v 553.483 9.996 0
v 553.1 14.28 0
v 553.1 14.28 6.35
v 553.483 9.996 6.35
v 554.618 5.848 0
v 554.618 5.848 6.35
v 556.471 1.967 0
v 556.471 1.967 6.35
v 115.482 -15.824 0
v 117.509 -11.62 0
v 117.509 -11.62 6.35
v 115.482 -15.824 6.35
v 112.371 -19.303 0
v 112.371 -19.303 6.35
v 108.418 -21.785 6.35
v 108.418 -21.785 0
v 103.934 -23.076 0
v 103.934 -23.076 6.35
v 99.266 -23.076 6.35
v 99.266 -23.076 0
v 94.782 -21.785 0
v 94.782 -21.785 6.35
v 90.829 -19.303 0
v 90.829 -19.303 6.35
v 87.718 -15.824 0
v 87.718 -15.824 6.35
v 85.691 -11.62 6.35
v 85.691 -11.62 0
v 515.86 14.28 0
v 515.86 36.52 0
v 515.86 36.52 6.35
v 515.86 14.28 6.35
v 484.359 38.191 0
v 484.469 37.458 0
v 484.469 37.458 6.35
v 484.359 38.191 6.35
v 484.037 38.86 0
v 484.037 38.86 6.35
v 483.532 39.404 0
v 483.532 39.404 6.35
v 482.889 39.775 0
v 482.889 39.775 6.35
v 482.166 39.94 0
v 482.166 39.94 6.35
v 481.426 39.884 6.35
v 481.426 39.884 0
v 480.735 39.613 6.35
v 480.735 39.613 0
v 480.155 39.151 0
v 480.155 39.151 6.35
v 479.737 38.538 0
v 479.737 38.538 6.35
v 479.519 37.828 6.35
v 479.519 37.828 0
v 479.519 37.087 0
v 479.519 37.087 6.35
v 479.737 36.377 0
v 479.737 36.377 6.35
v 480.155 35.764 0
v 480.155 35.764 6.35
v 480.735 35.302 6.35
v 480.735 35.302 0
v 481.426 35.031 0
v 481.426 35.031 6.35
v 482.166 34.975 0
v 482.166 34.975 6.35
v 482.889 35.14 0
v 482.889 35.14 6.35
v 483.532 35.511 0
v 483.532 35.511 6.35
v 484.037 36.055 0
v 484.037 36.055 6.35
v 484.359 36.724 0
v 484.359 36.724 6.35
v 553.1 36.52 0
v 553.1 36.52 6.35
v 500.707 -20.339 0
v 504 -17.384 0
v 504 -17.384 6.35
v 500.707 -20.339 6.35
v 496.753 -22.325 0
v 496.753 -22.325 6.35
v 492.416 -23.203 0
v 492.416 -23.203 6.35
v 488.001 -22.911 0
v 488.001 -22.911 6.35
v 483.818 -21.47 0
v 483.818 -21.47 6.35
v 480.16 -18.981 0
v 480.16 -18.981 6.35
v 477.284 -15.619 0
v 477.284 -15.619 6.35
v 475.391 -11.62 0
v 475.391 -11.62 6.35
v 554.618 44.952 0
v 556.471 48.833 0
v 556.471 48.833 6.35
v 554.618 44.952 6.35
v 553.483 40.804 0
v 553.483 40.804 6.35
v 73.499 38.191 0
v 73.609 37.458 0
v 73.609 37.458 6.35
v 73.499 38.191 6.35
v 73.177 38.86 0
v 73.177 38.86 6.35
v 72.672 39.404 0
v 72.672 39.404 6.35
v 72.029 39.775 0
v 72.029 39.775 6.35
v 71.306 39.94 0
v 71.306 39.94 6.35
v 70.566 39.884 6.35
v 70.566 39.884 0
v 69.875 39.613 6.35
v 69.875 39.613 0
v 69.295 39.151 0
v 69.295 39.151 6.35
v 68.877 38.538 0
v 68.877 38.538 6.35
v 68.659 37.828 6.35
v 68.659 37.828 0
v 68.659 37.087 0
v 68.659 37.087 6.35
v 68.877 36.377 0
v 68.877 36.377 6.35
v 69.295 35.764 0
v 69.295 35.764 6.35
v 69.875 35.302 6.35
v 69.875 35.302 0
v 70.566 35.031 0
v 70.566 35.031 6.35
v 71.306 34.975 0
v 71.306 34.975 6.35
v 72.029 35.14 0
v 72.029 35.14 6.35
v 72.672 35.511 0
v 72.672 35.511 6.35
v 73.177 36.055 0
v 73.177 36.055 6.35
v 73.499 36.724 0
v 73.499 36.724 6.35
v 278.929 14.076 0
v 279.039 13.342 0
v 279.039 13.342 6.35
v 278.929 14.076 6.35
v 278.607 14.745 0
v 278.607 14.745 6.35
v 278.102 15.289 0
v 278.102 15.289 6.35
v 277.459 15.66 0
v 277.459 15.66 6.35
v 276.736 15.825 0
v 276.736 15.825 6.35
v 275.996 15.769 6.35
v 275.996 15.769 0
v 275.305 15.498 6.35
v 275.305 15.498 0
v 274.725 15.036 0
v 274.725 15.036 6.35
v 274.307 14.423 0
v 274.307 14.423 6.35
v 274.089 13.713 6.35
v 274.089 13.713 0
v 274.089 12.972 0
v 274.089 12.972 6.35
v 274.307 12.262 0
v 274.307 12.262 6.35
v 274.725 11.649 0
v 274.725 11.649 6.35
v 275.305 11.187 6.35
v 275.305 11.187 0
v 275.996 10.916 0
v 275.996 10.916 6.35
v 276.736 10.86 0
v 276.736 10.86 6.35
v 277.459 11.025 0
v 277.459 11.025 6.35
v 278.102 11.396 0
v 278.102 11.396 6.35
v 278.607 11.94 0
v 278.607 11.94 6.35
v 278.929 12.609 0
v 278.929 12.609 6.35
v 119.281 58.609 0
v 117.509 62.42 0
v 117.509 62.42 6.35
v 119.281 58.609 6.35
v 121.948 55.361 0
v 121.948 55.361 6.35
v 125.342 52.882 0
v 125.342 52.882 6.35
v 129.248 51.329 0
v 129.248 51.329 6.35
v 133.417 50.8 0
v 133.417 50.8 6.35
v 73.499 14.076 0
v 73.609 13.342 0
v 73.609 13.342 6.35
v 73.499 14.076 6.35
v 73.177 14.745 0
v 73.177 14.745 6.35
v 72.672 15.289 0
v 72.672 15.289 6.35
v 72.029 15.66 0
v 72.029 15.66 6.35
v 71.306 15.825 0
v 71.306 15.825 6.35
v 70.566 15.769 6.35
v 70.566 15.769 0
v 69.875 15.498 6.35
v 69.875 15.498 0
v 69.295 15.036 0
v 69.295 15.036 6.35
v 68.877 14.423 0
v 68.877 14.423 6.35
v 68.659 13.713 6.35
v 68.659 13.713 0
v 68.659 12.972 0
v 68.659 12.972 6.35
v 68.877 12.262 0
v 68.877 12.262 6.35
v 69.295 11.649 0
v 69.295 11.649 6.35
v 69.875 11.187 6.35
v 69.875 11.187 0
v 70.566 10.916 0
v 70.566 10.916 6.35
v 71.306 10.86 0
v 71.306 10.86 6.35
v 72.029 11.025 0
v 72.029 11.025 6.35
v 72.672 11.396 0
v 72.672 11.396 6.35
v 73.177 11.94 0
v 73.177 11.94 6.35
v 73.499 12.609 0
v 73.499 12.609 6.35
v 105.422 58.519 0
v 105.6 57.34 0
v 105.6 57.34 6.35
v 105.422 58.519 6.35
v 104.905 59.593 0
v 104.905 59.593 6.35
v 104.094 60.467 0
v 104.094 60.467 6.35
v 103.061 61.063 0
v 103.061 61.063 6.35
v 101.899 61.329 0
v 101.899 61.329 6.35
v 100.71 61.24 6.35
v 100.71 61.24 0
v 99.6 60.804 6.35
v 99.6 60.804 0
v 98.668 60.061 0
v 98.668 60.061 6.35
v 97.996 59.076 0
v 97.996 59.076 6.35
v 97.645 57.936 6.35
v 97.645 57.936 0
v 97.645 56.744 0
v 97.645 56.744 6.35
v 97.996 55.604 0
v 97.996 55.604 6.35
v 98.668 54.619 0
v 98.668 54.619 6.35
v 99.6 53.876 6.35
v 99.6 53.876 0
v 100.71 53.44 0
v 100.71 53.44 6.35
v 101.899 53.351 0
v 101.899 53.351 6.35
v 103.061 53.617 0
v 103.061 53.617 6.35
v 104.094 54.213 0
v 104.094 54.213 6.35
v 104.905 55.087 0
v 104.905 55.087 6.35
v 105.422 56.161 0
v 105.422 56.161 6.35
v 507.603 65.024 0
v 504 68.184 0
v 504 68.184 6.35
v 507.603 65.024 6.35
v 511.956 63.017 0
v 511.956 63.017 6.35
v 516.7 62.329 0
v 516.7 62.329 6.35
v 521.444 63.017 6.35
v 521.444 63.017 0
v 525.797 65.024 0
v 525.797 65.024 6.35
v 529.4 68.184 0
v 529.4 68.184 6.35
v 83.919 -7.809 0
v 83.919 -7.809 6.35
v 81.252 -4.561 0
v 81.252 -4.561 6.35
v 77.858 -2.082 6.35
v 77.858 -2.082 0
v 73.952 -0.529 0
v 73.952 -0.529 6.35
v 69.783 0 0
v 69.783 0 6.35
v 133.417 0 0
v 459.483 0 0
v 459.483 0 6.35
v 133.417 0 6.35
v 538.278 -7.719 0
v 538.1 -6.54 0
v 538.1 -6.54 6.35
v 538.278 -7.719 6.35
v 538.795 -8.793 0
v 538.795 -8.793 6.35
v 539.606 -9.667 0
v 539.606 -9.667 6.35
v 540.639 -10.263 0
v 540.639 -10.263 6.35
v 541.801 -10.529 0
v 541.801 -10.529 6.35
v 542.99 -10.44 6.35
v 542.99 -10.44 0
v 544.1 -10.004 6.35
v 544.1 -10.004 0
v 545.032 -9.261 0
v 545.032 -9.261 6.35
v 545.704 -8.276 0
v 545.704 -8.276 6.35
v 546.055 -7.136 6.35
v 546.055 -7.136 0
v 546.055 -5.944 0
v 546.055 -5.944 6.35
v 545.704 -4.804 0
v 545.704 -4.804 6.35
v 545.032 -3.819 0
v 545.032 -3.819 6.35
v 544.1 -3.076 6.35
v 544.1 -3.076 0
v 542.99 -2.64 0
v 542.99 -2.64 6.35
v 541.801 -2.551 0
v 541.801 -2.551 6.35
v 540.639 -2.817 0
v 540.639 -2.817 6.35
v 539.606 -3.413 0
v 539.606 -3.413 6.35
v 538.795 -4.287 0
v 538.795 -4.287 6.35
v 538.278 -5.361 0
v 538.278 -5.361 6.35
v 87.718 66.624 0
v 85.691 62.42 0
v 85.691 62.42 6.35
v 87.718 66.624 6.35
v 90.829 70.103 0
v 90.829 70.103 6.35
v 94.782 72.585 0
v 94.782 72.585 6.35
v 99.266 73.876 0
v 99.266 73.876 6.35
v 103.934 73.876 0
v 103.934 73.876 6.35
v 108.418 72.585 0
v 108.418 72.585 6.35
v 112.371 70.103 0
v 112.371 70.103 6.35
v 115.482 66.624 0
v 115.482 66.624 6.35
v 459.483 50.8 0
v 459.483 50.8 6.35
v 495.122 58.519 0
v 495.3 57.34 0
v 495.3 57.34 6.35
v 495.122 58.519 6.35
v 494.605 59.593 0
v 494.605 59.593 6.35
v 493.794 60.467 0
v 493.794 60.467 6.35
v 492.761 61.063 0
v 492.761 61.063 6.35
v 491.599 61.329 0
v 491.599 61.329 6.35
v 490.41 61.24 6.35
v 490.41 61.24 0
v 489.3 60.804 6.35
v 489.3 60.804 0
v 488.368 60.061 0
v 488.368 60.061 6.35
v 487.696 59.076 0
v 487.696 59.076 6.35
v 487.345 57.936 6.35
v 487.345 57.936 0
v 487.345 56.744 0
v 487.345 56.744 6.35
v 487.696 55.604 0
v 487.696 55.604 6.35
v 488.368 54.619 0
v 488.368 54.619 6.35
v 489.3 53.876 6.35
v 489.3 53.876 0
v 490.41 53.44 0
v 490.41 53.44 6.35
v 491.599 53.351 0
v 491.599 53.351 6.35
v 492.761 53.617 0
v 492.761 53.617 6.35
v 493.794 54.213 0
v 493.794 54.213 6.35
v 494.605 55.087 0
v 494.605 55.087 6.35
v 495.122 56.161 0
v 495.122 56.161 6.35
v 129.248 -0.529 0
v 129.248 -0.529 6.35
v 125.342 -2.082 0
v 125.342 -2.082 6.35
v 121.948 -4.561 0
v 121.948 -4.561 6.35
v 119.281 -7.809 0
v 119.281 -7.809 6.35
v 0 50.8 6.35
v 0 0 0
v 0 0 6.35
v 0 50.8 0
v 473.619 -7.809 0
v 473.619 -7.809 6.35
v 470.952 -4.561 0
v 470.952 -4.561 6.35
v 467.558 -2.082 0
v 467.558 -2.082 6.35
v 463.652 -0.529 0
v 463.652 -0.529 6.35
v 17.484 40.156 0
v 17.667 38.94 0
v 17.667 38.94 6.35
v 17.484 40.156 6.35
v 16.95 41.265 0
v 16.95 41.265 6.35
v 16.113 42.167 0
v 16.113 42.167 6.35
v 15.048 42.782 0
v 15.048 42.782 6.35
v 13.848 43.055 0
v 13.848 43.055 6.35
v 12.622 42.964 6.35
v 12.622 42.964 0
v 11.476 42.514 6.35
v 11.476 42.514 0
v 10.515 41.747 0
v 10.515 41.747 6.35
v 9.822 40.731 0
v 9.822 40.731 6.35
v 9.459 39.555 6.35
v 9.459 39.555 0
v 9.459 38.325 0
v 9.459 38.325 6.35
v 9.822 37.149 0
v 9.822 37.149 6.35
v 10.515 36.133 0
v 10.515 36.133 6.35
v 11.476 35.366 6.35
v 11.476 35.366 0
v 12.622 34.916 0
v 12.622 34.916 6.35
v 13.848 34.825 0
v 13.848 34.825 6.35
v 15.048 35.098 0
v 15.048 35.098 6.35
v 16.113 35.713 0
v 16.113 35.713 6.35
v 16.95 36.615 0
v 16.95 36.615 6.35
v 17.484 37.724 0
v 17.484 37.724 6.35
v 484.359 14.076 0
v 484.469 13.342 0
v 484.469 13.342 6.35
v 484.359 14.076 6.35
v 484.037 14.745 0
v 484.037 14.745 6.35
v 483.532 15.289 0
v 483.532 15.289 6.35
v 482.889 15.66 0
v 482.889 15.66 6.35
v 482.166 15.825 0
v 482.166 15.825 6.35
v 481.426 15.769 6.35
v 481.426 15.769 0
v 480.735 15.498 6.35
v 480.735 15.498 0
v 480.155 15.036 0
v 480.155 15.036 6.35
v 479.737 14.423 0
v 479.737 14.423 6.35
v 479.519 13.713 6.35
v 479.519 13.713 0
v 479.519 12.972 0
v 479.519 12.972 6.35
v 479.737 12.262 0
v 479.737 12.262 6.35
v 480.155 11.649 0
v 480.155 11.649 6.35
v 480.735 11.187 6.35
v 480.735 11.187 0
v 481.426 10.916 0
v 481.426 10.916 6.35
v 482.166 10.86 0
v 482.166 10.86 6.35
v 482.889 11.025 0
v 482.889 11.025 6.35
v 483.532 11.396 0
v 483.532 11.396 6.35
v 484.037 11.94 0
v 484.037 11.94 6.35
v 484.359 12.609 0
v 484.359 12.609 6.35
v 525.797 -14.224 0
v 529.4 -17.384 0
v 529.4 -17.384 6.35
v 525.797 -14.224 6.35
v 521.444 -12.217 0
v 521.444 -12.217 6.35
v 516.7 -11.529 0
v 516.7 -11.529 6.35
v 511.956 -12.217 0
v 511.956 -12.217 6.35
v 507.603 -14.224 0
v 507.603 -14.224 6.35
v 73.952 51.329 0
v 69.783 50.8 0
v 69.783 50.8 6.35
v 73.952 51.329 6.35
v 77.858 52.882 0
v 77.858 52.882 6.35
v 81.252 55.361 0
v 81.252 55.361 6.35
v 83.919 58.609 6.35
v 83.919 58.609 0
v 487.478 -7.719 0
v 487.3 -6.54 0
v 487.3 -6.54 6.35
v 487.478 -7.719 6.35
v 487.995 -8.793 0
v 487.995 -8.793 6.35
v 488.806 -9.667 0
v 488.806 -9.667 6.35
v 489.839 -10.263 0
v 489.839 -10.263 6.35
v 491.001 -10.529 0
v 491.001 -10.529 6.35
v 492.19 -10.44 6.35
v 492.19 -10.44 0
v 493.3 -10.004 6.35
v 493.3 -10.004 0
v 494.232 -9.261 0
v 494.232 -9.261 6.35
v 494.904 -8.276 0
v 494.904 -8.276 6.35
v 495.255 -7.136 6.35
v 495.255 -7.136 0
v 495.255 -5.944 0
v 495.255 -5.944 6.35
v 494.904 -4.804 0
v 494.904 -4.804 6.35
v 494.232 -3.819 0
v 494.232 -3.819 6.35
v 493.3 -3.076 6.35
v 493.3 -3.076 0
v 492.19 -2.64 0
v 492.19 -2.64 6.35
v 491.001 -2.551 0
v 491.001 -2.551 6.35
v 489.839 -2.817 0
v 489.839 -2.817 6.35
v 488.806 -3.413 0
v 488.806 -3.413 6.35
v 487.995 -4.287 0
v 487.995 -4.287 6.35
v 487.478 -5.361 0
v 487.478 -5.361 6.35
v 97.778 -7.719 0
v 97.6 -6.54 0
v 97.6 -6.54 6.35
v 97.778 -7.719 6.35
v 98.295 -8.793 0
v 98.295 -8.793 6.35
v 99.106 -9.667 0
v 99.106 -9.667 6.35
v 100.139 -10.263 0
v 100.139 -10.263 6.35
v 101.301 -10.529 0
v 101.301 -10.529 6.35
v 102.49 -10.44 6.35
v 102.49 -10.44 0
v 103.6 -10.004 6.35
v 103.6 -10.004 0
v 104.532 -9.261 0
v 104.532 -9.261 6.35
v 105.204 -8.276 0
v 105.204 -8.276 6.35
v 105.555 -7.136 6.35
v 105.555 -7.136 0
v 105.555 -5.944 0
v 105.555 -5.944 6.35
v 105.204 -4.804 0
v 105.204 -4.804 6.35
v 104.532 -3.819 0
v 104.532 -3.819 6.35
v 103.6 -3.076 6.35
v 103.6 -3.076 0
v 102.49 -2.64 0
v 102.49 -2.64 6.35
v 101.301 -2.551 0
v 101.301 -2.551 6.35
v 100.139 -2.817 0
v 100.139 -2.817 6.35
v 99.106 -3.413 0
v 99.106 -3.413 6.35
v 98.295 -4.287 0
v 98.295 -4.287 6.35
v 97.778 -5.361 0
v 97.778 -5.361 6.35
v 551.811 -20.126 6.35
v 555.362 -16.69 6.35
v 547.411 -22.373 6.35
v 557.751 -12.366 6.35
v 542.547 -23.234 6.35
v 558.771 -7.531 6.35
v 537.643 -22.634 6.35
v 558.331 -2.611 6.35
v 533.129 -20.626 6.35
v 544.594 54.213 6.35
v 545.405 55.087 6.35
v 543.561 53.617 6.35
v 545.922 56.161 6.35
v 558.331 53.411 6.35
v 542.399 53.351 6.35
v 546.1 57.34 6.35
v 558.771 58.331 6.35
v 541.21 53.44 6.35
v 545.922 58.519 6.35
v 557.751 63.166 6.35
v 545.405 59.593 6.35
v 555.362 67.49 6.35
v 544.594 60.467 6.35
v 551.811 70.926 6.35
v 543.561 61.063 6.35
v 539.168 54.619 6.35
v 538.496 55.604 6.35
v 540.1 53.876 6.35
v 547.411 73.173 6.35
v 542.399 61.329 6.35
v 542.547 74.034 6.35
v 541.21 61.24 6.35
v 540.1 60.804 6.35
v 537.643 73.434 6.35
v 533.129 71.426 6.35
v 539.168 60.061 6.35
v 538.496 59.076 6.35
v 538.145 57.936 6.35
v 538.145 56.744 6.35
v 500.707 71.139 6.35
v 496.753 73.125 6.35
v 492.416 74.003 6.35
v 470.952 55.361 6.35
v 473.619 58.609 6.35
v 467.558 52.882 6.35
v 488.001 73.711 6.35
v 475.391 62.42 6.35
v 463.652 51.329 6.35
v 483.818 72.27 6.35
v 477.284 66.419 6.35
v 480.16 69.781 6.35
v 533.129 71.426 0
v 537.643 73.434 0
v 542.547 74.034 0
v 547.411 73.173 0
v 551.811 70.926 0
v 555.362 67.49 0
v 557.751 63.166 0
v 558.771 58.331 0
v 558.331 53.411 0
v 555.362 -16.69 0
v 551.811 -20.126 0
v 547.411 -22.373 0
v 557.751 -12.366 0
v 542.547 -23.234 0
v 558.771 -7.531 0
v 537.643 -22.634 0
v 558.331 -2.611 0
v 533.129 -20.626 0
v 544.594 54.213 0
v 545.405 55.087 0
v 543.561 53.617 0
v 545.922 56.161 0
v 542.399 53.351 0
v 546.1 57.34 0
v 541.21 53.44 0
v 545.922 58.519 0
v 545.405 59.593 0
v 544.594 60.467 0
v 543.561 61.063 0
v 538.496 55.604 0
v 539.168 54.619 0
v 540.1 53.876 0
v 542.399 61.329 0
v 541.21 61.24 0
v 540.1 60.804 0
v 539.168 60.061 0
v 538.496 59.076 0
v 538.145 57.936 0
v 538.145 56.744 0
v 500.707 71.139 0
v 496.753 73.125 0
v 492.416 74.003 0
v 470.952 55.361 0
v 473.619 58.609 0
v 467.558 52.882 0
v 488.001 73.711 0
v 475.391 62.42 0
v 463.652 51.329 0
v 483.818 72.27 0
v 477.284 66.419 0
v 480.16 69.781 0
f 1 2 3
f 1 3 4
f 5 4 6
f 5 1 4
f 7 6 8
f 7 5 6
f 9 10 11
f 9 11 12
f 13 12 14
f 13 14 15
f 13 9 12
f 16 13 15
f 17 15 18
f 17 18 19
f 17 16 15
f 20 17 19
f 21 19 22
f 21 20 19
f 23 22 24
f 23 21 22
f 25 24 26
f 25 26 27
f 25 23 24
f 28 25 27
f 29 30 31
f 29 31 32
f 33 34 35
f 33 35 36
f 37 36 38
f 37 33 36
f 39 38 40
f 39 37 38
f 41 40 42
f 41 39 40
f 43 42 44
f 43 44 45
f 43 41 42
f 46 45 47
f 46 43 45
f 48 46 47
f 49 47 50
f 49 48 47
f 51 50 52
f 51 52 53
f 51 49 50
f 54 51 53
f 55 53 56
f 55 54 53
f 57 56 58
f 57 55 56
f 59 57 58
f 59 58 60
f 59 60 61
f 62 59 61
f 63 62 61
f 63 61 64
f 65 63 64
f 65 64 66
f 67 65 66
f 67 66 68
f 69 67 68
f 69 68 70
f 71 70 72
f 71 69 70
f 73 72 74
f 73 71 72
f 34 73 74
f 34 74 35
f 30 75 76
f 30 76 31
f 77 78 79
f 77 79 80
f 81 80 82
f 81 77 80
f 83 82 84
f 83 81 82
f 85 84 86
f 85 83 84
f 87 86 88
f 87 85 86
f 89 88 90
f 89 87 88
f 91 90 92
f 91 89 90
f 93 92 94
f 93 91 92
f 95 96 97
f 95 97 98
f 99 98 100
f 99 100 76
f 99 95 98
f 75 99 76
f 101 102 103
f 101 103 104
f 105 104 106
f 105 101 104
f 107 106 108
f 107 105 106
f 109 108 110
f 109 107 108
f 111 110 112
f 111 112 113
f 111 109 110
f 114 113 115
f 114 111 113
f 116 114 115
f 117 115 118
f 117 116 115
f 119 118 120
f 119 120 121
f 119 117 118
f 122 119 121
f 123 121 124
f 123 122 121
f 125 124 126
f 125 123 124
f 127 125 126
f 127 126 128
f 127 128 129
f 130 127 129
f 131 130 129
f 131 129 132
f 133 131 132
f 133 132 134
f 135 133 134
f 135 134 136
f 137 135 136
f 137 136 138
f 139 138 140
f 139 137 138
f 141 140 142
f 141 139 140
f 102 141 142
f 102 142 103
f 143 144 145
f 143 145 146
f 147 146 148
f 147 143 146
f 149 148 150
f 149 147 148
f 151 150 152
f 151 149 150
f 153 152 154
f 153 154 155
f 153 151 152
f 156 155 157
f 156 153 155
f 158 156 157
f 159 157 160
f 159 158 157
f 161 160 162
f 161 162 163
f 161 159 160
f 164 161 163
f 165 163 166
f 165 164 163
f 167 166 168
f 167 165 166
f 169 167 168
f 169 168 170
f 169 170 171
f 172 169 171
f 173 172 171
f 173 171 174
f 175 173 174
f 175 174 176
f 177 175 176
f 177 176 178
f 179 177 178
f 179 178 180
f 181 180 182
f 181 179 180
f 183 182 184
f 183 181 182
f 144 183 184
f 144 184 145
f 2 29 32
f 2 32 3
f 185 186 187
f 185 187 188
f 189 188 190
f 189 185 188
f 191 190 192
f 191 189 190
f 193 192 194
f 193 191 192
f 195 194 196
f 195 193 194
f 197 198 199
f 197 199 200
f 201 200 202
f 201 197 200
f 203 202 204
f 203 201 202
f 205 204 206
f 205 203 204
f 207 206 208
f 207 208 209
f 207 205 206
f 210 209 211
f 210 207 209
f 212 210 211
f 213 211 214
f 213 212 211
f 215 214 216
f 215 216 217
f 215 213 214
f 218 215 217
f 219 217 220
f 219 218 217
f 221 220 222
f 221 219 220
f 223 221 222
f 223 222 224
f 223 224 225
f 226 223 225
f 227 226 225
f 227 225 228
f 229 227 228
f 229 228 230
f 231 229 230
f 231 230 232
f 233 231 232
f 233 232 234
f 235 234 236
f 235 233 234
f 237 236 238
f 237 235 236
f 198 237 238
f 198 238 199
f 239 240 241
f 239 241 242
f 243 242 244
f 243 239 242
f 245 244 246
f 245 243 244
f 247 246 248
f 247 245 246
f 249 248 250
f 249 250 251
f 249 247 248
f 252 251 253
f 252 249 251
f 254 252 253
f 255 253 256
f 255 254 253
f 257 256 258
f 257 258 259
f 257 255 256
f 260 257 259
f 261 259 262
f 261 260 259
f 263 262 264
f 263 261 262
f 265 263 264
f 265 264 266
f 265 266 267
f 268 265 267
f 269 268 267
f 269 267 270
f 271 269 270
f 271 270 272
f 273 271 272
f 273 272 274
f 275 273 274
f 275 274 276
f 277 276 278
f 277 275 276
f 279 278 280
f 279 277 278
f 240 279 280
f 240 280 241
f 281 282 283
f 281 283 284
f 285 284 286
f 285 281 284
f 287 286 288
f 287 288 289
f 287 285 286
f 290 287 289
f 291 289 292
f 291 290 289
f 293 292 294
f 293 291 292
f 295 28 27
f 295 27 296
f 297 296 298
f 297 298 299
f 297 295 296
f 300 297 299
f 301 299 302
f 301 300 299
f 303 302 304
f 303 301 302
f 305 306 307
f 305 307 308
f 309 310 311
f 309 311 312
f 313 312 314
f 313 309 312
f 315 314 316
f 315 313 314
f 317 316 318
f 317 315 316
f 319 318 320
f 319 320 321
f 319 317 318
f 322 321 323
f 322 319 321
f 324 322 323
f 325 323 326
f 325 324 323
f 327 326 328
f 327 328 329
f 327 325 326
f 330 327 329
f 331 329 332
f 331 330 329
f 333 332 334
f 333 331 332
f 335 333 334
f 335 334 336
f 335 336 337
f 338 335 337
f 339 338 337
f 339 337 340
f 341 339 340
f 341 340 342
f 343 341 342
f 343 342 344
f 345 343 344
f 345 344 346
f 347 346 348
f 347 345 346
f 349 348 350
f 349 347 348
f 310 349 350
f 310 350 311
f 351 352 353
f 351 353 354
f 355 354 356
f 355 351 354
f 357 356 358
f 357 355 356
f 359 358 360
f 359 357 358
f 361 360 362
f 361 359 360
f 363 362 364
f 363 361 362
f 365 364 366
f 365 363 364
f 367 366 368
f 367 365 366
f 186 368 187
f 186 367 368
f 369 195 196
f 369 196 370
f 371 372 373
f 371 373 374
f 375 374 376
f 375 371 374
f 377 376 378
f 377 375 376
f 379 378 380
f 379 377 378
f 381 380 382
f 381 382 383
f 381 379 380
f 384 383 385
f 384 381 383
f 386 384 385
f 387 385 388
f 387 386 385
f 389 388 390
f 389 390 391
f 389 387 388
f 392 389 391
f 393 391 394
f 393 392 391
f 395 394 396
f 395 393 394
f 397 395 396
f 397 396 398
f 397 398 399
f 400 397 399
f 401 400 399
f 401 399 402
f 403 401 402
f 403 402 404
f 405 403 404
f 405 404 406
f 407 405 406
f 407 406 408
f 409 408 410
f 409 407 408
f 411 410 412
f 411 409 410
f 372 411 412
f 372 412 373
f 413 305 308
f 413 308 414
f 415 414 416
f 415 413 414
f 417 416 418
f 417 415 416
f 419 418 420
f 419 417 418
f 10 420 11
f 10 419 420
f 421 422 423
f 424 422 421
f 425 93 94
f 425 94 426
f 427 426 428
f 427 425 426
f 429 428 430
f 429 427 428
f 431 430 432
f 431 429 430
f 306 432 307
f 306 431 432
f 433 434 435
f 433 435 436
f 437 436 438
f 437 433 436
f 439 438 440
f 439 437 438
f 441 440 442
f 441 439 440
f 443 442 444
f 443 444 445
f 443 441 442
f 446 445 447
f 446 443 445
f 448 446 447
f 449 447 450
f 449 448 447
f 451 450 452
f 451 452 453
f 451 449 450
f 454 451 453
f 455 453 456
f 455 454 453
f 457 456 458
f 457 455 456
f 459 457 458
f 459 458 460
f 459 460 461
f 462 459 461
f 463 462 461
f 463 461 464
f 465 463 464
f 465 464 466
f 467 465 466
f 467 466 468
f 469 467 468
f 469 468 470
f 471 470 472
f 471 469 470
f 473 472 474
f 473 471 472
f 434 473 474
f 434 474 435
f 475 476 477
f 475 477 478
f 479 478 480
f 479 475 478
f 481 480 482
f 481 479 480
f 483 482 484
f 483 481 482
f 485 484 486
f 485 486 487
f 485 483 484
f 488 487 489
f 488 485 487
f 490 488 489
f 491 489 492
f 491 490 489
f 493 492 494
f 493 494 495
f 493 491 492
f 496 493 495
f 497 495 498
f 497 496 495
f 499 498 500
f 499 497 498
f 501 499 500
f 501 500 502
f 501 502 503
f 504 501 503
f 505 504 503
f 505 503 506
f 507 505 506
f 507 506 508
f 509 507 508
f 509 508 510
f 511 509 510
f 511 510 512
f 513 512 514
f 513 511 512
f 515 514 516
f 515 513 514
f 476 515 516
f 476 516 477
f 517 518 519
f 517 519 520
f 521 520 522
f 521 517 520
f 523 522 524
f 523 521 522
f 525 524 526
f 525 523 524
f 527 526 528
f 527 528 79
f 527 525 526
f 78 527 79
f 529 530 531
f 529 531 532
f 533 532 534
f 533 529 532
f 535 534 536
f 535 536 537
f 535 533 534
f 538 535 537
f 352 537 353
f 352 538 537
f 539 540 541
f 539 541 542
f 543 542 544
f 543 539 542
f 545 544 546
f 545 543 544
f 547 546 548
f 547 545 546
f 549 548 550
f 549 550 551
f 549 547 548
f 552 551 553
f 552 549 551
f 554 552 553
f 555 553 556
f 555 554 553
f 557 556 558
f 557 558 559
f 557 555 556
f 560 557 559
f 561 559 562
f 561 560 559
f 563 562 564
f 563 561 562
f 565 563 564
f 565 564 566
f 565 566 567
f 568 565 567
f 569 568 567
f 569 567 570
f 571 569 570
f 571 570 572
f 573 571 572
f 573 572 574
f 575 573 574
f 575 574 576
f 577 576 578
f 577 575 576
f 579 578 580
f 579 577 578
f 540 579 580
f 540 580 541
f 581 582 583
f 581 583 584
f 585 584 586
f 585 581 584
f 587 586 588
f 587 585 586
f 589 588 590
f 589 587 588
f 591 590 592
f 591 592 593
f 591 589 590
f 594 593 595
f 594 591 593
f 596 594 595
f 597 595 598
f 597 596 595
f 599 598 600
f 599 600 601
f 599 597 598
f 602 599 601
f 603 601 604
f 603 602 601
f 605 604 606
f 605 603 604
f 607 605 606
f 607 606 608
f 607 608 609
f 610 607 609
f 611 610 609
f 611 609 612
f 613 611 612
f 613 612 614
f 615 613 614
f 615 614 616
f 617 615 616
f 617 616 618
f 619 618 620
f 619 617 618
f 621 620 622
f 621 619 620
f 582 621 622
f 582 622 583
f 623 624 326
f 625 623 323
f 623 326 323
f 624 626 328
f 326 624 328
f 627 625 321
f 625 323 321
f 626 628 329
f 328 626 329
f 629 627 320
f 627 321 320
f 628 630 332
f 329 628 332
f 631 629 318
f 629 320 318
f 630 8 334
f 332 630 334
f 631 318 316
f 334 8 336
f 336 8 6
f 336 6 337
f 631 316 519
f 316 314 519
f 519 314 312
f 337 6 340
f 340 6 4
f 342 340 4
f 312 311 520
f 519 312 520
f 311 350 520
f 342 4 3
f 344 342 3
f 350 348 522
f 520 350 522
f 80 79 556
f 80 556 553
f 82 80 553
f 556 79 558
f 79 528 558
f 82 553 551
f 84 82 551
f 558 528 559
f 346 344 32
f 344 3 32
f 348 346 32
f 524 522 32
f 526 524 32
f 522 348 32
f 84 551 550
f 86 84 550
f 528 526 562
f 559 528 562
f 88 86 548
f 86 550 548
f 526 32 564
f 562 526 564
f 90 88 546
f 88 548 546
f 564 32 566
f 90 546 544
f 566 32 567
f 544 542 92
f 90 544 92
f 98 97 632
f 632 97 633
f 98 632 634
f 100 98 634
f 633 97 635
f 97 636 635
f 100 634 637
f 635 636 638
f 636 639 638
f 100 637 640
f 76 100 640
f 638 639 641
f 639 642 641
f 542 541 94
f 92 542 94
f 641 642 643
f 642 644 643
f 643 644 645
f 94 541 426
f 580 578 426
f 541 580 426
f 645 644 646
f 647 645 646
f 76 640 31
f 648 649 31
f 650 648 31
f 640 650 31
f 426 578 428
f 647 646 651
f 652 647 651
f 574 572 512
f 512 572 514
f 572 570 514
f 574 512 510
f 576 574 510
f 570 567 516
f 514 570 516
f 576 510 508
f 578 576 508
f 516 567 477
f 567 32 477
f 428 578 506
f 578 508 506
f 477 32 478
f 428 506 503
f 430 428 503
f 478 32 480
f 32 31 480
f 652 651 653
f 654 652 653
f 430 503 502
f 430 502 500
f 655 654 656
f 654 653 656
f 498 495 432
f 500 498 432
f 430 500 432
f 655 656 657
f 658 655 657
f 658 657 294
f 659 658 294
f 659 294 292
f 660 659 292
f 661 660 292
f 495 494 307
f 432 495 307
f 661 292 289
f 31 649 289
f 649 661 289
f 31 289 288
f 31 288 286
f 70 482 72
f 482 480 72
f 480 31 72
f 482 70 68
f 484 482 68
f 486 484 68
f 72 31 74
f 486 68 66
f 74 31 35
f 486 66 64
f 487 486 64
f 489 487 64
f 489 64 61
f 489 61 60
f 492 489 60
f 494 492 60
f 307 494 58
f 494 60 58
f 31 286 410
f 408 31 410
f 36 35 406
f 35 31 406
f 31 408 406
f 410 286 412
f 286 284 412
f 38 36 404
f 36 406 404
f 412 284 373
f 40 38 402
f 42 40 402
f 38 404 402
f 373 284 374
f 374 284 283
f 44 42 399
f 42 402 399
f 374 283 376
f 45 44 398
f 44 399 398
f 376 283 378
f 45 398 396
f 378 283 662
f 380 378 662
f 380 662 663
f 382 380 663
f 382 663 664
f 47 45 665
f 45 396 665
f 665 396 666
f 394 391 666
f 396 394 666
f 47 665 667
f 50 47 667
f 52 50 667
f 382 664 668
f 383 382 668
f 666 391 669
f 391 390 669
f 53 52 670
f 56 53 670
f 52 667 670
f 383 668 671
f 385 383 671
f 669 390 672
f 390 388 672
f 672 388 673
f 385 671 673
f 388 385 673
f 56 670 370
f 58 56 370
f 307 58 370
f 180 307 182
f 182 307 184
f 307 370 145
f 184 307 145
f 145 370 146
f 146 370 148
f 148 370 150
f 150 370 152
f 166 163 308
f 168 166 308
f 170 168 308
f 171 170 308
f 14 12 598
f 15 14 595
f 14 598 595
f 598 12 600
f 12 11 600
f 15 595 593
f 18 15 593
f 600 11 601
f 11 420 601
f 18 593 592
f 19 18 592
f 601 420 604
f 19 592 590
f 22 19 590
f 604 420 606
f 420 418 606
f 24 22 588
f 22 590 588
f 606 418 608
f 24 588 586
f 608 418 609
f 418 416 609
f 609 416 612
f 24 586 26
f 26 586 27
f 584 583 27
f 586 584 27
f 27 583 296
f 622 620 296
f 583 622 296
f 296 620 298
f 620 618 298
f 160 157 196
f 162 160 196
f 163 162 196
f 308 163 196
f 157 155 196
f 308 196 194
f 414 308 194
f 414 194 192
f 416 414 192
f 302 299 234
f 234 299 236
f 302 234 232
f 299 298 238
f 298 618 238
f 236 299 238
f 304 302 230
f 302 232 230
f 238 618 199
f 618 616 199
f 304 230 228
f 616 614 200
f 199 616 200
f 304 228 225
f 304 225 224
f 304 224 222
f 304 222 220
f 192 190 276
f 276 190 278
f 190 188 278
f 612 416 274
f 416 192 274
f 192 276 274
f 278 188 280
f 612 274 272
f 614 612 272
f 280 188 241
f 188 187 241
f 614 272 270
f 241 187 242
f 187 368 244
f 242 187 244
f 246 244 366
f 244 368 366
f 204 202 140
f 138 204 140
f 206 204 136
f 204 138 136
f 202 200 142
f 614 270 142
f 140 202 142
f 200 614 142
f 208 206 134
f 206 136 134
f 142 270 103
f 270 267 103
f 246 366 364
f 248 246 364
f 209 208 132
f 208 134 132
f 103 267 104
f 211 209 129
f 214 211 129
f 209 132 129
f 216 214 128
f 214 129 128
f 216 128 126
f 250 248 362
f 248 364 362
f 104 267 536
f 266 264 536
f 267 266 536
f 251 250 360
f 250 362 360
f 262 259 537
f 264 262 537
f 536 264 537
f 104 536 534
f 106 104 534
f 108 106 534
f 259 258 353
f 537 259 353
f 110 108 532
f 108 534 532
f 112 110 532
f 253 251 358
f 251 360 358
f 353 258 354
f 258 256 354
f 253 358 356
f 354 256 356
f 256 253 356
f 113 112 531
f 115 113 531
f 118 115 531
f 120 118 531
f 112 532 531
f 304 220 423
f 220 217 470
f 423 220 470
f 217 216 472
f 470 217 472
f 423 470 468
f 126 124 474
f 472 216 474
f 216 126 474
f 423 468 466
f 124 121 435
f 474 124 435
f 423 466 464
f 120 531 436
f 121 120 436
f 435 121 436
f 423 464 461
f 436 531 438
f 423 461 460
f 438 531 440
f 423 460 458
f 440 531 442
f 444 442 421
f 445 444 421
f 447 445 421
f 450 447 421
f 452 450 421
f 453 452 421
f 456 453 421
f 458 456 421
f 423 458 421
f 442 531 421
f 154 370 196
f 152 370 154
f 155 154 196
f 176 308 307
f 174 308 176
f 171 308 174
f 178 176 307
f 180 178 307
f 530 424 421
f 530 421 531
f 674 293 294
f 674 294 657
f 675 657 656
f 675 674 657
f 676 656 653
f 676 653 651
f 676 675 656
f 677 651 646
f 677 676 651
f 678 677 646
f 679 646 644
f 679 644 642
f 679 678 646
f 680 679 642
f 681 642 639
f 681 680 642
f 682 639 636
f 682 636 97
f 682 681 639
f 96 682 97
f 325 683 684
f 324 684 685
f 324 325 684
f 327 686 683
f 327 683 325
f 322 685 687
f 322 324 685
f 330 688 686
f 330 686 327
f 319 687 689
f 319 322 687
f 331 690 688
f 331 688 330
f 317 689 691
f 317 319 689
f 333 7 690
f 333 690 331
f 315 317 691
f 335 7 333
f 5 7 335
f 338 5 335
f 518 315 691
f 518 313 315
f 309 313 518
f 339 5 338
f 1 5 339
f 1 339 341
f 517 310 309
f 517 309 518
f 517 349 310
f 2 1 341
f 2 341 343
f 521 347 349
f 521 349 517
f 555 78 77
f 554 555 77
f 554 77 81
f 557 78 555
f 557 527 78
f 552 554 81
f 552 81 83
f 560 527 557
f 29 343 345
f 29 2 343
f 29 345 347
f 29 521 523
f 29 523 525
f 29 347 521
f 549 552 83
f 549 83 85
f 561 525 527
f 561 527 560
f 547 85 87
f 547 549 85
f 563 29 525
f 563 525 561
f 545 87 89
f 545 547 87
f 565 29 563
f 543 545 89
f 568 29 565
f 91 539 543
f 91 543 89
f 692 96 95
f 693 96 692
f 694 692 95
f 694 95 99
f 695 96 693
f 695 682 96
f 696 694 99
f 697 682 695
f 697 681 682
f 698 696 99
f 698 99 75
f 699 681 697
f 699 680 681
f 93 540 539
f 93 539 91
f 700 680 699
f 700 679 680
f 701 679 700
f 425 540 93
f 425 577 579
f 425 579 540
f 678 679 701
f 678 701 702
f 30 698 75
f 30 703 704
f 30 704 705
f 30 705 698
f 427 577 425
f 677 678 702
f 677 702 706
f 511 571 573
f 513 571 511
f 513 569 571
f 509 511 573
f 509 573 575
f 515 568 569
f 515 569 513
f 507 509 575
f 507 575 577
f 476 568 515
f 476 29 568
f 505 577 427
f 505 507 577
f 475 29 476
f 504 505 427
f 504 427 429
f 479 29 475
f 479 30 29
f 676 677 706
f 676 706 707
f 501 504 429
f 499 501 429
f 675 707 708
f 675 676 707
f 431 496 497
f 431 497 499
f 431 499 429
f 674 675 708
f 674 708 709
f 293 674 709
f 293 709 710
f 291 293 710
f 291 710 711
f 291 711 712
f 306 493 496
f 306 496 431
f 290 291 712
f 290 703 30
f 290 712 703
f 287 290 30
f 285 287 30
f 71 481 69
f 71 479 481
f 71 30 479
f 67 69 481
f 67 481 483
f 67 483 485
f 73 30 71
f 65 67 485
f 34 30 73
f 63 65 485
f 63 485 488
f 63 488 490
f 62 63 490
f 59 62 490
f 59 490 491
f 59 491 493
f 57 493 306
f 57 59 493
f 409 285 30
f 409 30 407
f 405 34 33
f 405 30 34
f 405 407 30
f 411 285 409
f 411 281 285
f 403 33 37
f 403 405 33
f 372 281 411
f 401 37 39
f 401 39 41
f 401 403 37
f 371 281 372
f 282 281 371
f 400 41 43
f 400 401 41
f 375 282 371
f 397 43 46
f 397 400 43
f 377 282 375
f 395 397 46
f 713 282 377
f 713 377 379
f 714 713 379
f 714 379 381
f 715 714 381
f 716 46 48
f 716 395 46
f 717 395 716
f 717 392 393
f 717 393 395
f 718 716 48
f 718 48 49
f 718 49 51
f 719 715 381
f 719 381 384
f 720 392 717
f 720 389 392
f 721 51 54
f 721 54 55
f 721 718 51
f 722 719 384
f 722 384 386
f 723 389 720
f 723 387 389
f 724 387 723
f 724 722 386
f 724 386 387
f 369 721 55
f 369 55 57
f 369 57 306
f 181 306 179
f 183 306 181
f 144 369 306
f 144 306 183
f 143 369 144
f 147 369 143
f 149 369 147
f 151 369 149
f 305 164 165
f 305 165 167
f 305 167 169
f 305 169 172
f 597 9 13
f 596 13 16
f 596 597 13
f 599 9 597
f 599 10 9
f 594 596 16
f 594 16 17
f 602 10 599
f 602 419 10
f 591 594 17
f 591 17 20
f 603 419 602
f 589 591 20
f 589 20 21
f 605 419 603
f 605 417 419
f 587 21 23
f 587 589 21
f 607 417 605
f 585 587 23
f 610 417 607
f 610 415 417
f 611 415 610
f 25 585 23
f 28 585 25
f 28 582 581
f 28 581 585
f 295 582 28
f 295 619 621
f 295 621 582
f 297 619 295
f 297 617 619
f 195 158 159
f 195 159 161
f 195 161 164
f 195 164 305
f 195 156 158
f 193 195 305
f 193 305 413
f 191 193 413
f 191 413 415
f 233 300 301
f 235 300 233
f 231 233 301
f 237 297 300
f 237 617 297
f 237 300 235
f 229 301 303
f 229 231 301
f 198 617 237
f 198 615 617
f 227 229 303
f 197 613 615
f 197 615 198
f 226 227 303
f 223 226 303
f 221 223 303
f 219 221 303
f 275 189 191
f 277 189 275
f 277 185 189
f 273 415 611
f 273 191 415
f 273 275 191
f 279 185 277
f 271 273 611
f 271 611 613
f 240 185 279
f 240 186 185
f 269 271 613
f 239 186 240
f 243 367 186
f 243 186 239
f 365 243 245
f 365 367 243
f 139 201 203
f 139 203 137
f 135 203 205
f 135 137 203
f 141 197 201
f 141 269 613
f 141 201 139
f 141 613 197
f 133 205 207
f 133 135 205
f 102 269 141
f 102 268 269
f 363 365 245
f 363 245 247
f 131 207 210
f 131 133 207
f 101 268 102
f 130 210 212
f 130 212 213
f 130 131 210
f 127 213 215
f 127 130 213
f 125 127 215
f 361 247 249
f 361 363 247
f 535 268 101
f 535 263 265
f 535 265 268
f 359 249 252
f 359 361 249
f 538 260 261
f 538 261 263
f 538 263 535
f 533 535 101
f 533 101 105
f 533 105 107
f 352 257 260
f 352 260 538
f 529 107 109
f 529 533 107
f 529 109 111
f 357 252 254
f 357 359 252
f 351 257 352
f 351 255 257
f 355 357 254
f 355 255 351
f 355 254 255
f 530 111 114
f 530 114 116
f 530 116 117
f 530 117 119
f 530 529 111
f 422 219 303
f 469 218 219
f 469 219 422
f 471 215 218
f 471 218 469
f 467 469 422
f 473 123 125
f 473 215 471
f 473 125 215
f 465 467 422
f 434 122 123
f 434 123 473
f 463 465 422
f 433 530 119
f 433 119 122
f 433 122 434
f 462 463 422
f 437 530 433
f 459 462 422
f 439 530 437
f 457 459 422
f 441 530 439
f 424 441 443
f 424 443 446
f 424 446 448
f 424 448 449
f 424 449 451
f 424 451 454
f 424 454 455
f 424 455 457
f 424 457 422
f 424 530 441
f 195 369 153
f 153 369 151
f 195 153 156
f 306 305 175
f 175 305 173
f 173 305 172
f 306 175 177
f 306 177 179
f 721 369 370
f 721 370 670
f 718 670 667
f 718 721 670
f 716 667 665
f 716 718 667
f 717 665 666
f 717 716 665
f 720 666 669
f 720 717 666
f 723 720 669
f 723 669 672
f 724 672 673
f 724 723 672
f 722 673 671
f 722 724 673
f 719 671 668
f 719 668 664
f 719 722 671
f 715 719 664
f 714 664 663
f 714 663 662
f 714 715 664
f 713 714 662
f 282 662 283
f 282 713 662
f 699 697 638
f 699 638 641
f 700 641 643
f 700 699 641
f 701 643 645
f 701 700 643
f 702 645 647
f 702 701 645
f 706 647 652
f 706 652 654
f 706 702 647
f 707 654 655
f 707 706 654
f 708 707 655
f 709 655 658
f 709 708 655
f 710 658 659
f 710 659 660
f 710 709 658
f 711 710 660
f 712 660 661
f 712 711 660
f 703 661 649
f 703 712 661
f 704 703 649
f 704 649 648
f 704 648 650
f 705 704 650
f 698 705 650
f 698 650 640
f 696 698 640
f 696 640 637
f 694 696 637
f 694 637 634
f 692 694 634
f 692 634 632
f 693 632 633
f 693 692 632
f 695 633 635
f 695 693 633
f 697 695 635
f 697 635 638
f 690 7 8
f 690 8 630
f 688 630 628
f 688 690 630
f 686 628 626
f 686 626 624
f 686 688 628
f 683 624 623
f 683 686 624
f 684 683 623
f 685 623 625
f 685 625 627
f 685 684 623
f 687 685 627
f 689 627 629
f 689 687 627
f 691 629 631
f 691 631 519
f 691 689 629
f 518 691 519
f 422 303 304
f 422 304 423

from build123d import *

# Parameters (mm, degrees)
SKETCH1_R           = 4.127
SKETCH1_R_2         = 4
SKETCH1_R_3         = 2.4892
BOSS_EXTRUDE1_DEPTH = 6.35


with BuildPart() as part:
    # Sketch1 → Boss-Extrude1 (new body)
    with BuildSketch(Plane.XY):
        with BuildLine():
            Line((0, 50.8), (69.782797106, 50.8))
            ThreePointArc((69.782797106, 50.8), (79.63302553, 54.01434095), (85.691398553, 62.42))
            ThreePointArc((85.691398553, 62.42), (101.6, 74.04), (117.508601447, 62.42))
            ThreePointArc((117.508601447, 62.42), (123.56697447, 54.01434095), (133.417202894, 50.8))
            Line((133.417202894, 50.8), (459.482797106, 50.8))
            ThreePointArc((459.482797106, 50.8), (469.33302553, 54.01434095), (475.391398553, 62.42))
            ThreePointArc((475.391398553, 62.42), (488.001405867, 73.710988875), (504, 68.184353369))
            ThreePointArc((504, 68.184353369), (516.7, 62.328706739), (529.4, 68.184353369))
            ThreePointArc((529.4, 68.184353369), (551.811441752, 70.92594491), (556.471129688, 48.833494754))
            ThreePointArc((556.471129688, 48.833494754), (553.958009173, 42.90331161), (553.1, 36.52))
            Line((553.1, 36.52), (515.860000058, 36.52))
            Line((515.860000058, 36.52), (515.860000058, 14.28))
            Line((515.860000058, 14.28), (553.1, 14.28))
            ThreePointArc((553.1, 14.28), (553.958009173, 7.89668839), (556.471129688, 1.966505246))
            ThreePointArc((556.471129688, 1.966505246), (551.811441752, -20.12594491), (529.4, -17.384353369))
            ThreePointArc((529.4, -17.384353369), (516.7, -11.528706739), (504, -17.384353369))
            ThreePointArc((504, -17.384353369), (488.001405867, -22.910988875), (475.391398553, -11.62))
            ThreePointArc((475.391398553, -11.62), (469.33302553, -3.21434095), (459.482797106, 0))
            Line((459.482797106, 0), (133.417202894, 0))
            ThreePointArc((133.417202894, 0), (123.56697447, -3.21434095), (117.508601447, -11.62))
            ThreePointArc((117.508601447, -11.62), (101.6, -23.24), (85.691398553, -11.62))
            ThreePointArc((85.691398553, -11.62), (79.63302553, -3.21434095), (69.782797106, 0))
            Line((69.782797106, 0), (0, 0))
            Line((0, 0), (0, 50.8))
        make_face()
        with Locations((13.54, 38.94)):
            Circle(SKETCH1_R, mode=Mode.SUBTRACT)
        with Locations(Location((101.6, -6.54, 0), (0, 0, 180))):
            Circle(SKETCH1_R_2, mode=Mode.SUBTRACT)
        with Locations((481.98, 13.3425)):
            Circle(SKETCH1_R_3, mode=Mode.SUBTRACT)
        with Locations((481.98, 37.4575)):
            Circle(SKETCH1_R_3, mode=Mode.SUBTRACT)
        with Locations((276.55, 13.3425)):
            Circle(SKETCH1_R_3, mode=Mode.SUBTRACT)
        with Locations((71.12, 13.3425)):
            Circle(SKETCH1_R_3, mode=Mode.SUBTRACT)
        with Locations((71.12, 37.4575)):
            Circle(SKETCH1_R_3, mode=Mode.SUBTRACT)
        with Locations((101.6, 57.34)):
            Circle(SKETCH1_R_2, mode=Mode.SUBTRACT)
        with Locations((491.3, 57.34)):
            Circle(SKETCH1_R_2, mode=Mode.SUBTRACT)
        with Locations((542.1, 57.34)):
            Circle(SKETCH1_R_2, mode=Mode.SUBTRACT)
        with Locations(Location((542.1, -6.54, 0), (0, 0, 180))):
            Circle(SKETCH1_R_2, mode=Mode.SUBTRACT)
        with Locations(Location((491.3, -6.54, 0), (0, 0, 180))):
            Circle(SKETCH1_R_2, mode=Mode.SUBTRACT)
    extrude(amount=BOSS_EXTRUDE1_DEPTH)


solid = part.part
